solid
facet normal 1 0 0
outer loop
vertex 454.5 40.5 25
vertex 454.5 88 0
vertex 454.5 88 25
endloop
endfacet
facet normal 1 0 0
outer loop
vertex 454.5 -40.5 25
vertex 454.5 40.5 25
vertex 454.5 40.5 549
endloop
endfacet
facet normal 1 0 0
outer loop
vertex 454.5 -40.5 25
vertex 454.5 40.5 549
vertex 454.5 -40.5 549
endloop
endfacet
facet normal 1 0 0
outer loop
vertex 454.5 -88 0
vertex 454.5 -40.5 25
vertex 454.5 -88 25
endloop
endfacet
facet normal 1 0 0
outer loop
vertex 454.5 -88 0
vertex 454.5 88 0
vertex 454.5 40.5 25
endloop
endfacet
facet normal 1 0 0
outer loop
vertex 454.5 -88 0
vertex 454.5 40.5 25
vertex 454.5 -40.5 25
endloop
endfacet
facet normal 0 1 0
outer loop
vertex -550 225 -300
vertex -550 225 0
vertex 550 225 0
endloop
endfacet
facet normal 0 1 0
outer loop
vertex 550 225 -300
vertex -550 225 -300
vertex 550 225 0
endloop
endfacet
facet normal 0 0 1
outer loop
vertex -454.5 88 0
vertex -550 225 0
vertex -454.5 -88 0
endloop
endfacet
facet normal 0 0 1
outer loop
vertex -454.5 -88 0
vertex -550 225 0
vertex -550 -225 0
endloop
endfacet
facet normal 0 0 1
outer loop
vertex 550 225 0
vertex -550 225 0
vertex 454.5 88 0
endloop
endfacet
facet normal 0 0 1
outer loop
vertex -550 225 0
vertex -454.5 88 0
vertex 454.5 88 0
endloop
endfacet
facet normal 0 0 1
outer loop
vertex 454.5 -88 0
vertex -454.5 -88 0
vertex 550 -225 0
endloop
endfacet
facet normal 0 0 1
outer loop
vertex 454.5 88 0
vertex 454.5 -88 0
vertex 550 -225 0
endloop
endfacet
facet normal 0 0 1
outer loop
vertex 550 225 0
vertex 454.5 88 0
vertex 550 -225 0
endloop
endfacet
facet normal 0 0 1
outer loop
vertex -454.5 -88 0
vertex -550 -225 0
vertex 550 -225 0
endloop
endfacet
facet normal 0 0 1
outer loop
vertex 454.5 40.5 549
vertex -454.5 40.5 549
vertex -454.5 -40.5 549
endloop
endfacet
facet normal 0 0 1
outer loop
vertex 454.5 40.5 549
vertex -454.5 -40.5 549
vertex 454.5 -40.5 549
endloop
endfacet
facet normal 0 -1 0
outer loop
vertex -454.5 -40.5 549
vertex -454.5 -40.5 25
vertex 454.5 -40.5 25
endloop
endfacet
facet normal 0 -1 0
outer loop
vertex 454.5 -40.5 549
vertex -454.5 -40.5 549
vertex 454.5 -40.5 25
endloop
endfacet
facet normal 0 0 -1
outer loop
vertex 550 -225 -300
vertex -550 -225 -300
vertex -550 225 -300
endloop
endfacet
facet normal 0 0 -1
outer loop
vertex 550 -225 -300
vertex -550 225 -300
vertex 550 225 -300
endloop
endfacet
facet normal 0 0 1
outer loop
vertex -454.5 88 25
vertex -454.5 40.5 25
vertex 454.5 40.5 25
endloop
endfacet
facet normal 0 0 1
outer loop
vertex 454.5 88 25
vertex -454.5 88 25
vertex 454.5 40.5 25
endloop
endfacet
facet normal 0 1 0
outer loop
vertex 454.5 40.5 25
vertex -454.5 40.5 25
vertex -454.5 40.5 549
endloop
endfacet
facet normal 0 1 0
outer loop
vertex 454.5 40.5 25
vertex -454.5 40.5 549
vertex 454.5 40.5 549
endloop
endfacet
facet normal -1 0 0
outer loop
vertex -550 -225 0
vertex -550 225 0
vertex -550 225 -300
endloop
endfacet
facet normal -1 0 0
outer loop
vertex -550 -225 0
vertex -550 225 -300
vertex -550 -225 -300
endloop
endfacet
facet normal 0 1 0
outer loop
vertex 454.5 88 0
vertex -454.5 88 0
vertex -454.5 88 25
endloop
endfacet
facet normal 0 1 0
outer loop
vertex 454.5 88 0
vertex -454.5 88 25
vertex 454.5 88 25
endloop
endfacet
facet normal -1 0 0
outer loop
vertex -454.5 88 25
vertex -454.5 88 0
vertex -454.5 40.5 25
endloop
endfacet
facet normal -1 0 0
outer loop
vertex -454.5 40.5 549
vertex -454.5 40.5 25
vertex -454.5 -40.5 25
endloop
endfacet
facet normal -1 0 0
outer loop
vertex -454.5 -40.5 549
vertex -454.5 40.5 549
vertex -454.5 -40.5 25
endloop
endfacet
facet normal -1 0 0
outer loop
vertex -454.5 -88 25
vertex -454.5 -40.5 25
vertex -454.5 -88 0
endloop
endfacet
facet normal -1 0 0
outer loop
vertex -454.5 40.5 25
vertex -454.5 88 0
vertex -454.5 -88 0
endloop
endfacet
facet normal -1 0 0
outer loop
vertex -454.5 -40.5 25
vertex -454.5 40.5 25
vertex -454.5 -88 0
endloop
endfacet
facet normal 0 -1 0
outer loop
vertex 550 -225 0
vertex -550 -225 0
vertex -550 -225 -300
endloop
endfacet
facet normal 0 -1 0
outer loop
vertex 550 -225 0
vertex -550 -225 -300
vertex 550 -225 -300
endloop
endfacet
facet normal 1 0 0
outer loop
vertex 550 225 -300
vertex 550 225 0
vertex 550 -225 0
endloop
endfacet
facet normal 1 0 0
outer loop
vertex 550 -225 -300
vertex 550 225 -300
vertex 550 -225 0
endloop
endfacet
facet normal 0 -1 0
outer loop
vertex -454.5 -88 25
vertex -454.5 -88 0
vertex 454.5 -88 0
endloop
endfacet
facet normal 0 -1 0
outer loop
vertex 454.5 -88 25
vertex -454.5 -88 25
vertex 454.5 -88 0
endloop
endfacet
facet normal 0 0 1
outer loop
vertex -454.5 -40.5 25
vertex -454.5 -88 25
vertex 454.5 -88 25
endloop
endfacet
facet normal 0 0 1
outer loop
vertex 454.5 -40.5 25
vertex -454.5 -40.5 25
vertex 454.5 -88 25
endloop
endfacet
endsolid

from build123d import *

# Parameters (mm, degrees)
F0_W     = 909
F0_H     = 81
F1_DEPTH = 549
F2_W     = 909
F2_H     = 176
F3_DEPTH = 25
F4_W     = 1100
F4_H     = 450
F5_DEPTH = 300


with BuildPart() as f1:
    # F0 (on Top) → F1 (new body)
    with BuildSketch(Plane.XY):
        Rectangle(F0_W, F0_H)
    extrude(amount=F1_DEPTH)

    # F2 (on face) → F3 (join)
    with BuildSketch(Plane(origin=(0, 0, 0), x_dir=(1, 0, 0), z_dir=(0, 0, -1))):
        Rectangle(F2_W, F2_H)
    extrude(amount=-F3_DEPTH)

    # F4 (on face) → F5 (join)
    with BuildSketch(Plane(origin=(0, 0, 0), x_dir=(1, 0, 0), z_dir=(0, 0, -1))):
        Rectangle(F4_W, F4_H)
    extrude(amount=F5_DEPTH)


solid = f1.part
